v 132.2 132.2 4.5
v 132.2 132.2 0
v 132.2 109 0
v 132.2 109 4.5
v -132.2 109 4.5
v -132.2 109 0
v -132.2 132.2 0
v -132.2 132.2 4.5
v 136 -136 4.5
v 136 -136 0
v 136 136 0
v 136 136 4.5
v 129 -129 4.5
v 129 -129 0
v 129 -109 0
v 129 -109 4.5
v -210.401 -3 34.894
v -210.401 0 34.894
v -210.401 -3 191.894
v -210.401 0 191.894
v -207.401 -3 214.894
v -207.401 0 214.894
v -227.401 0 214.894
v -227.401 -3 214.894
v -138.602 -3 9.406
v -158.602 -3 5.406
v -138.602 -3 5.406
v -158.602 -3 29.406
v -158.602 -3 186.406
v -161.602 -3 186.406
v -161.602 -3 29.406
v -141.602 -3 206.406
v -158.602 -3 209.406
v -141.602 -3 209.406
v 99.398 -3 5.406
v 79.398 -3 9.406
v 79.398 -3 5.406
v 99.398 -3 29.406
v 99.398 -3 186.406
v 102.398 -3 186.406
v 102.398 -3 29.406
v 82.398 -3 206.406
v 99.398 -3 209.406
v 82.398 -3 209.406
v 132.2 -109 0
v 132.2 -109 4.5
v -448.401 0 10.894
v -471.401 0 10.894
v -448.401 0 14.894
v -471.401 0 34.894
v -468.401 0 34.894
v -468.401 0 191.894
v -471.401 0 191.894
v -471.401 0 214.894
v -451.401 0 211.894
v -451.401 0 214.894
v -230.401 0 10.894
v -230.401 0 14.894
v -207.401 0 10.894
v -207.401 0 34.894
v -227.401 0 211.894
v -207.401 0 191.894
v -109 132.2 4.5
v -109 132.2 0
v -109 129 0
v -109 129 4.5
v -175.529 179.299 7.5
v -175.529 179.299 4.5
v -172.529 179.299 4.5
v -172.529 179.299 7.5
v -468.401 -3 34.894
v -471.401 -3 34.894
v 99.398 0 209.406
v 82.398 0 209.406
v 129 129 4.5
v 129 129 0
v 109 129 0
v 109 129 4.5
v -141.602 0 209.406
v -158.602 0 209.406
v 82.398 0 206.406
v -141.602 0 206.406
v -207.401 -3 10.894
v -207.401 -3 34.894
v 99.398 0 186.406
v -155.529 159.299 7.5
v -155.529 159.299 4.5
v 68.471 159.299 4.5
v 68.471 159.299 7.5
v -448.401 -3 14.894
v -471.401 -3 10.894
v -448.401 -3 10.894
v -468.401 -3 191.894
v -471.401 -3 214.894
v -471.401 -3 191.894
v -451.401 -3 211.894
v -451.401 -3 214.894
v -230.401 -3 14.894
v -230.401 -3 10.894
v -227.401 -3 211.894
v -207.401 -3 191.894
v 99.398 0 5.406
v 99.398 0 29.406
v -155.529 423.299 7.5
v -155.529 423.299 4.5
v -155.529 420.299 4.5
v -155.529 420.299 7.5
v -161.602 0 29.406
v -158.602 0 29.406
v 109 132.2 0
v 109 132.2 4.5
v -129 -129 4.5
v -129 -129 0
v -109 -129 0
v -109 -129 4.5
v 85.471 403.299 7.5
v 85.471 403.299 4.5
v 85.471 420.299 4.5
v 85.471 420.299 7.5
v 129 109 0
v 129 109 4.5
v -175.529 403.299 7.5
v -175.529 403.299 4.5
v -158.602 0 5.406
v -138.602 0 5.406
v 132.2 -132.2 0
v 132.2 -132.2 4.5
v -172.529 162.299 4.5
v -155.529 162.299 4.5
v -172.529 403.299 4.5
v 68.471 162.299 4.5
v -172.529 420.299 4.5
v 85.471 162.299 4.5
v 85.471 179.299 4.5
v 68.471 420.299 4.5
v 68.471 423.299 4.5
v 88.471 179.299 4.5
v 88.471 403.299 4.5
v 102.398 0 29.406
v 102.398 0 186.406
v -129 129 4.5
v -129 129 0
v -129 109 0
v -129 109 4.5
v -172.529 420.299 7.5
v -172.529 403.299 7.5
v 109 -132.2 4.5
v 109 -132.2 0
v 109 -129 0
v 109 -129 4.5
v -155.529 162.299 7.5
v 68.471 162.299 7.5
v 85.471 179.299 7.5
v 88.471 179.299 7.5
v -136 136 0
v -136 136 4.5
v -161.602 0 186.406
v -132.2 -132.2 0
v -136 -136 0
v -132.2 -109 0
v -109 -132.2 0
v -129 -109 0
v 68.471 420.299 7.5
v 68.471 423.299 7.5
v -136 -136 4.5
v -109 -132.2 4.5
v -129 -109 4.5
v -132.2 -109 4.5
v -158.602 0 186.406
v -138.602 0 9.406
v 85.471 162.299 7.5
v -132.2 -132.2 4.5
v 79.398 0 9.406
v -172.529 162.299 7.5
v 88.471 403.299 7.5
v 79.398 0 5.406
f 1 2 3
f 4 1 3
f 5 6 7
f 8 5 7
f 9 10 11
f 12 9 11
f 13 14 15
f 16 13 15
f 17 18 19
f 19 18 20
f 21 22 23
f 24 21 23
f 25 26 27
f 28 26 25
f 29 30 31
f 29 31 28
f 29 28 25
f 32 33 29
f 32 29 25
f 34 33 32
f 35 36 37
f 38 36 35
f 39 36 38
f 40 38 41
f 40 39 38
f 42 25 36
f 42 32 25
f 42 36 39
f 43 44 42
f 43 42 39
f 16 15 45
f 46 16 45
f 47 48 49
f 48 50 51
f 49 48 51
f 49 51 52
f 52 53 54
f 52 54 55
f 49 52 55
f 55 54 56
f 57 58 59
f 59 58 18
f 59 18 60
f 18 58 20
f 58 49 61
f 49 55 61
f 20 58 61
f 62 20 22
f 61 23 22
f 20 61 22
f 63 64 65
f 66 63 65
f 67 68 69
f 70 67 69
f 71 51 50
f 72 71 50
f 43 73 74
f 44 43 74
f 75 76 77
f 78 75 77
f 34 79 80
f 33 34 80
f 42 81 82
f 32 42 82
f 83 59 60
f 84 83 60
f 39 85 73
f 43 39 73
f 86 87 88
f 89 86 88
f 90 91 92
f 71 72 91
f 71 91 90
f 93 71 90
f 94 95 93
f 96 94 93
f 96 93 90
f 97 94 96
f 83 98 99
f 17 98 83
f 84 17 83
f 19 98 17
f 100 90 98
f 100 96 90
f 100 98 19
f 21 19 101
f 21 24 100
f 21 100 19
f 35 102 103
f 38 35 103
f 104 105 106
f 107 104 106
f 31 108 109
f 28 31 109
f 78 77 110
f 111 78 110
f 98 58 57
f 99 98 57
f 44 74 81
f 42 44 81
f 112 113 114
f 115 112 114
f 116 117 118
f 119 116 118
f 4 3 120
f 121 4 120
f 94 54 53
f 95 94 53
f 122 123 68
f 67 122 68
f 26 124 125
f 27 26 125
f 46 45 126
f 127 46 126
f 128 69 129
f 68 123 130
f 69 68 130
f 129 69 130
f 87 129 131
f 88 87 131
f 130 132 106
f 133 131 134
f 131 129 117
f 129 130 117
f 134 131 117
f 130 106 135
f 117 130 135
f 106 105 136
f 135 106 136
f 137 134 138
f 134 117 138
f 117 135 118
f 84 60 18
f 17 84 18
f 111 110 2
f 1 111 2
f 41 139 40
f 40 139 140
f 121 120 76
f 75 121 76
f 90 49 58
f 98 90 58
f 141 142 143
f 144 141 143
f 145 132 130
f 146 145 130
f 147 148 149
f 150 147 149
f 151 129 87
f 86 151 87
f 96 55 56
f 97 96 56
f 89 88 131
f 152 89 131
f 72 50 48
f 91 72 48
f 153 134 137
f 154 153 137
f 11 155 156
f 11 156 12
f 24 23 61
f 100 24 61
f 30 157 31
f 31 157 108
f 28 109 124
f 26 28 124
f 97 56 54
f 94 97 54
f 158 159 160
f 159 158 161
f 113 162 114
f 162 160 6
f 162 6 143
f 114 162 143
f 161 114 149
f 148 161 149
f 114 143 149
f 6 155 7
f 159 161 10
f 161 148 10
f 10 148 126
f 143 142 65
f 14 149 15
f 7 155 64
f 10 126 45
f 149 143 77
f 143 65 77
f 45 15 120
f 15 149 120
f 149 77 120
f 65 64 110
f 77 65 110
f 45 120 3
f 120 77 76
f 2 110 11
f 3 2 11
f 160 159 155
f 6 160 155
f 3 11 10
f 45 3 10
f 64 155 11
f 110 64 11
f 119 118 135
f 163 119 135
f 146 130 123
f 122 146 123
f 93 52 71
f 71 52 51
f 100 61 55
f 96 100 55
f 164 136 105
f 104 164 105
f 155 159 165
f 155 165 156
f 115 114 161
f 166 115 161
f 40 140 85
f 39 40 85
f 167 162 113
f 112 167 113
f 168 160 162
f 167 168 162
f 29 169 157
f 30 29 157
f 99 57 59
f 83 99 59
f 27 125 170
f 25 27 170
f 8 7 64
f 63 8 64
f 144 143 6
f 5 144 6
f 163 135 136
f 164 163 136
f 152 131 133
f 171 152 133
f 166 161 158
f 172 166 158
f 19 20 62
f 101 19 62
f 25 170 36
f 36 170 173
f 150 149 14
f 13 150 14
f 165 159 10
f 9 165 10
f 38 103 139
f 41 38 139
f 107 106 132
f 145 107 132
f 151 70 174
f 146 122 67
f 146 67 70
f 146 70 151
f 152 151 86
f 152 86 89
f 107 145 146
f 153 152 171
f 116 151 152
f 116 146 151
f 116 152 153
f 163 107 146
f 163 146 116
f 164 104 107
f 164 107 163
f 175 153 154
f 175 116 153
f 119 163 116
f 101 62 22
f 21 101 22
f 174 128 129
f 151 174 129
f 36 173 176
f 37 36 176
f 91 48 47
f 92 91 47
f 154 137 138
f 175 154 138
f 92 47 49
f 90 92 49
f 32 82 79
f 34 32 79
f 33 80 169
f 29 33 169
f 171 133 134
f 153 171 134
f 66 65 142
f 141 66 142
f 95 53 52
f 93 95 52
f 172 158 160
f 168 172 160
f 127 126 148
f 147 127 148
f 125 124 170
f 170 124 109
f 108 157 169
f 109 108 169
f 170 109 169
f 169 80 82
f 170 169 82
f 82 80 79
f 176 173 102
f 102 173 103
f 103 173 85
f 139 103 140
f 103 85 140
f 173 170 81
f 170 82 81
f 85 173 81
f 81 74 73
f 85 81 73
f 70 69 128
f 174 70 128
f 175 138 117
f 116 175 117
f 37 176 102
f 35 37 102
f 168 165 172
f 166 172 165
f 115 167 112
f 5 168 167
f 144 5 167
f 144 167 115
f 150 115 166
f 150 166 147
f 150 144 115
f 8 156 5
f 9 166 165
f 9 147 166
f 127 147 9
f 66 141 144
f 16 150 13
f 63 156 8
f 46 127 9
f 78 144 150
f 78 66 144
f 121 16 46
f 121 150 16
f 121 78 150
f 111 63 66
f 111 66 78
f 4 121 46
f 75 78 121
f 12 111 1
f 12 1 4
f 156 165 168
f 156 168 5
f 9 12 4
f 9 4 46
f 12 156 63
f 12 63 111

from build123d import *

# Parameters (mm, degrees)
F0_W     = 272
F0_H     = 272
F1_DEPTH = 4.5
F3_DEPTH = 3
F5_DEPTH = 3
F7_DEPTH = 3


with BuildPart() as f1:
    # F0 (on Top) → F1 (new body)
    with BuildSketch(Plane.XY):
        Rectangle(F0_W, F0_H)
        Polygon((-109, -129), (-109, -132.2), (-132.2, -132.2), (-132.2, -109), (-129, -109), (-129, -129), align=None, mode=Mode.SUBTRACT)
        Polygon((129, -109), (132.2, -109), (132.2, -132.2), (109, -132.2), (109, -129), (129, -129), align=None, mode=Mode.SUBTRACT)
        Polygon((-129, 129), (-129, 109), (-132.2, 109), (-132.2, 132.2), (-109, 132.2), (-109, 129), align=None, mode=Mode.SUBTRACT)
        Polygon((109, 129), (109, 132.2), (132.2, 132.2), (132.2, 109), (129, 109), (129, 129), align=None, mode=Mode.SUBTRACT)
    extrude(amount=F1_DEPTH)


with BuildPart() as f3:
    # F2 (on Front) → F3 (new body)
    with BuildSketch(Plane.XZ):
        Polygon((-138.601948, 5.405925), (-138.601948, 9.405925), (79.398052, 9.405925), (79.398052, 5.405925), (99.398052, 5.405925), (99.398052, 9.405925), (99.398052, 29.405925), (102.398052, 29.405925), (102.398052, 186.405925), (99.398052, 186.405925), (99.398052, 209.405925), (82.398052, 209.405925), (82.398052, 206.405925), (-141.601948, 206.405925), (-141.601948, 209.405925), (-158.601948, 209.405925), (-158.601948, 186.405925), (-161.601948, 186.405925), (-161.601948, 29.405925), (-158.601948, 29.405925), (-158.601948, 9.405925), (-158.601948, 5.405925), align=None)
    extrude(amount=F3_DEPTH)


with BuildPart() as f5:
    # F4 (on Front) → F5 (new body)
    with BuildSketch(Plane.XZ):
        Polygon((-448.400591, 10.893699), (-448.400591, 14.893699), (-230.400591, 14.893699), (-230.400591, 10.893699), (-207.400591, 10.893699), (-207.400591, 14.893699), (-207.400591, 34.893699), (-210.400591, 34.893699), (-210.400591, 191.893699), (-207.400591, 191.893699), (-207.400591, 214.893699), (-227.400591, 214.893699), (-227.400591, 211.893699), (-451.400591, 211.893699), (-451.400591, 214.893699), (-471.400591, 214.893699), (-471.400591, 191.893699), (-468.400591, 191.893699), (-468.400591, 34.893699), (-471.400591, 34.893699), (-471.400591, 14.893699), (-471.400591, 10.893699), align=None)
    extrude(amount=F5_DEPTH)


with BuildPart() as f7:
    # F6 (on face) → F7 (new body)
    with BuildSketch(Plane.XY.offset(4.5)):
        Polygon((68.47092, 423.298527), (-155.52908, 423.298527), (-155.52908, 420.298527), (-172.52908, 420.298527), (-172.52908, 403.298527), (-175.52908, 403.298527), (-175.52908, 179.298527), (-172.52908, 179.298527), (-172.52908, 162.298527), (-155.52908, 162.298527), (-155.52908, 159.298527), (68.47092, 159.298527), (68.47092, 162.298527), (85.47092, 162.298527), (85.47092, 179.298527), (88.47092, 179.298527), (88.47092, 403.298527), (85.47092, 403.298527), (85.47092, 420.298527), (68.47092, 420.298527), align=None)
    extrude(amount=F7_DEPTH)


solid = Compound([f1.part, f3.part, f5.part, f7.part])
